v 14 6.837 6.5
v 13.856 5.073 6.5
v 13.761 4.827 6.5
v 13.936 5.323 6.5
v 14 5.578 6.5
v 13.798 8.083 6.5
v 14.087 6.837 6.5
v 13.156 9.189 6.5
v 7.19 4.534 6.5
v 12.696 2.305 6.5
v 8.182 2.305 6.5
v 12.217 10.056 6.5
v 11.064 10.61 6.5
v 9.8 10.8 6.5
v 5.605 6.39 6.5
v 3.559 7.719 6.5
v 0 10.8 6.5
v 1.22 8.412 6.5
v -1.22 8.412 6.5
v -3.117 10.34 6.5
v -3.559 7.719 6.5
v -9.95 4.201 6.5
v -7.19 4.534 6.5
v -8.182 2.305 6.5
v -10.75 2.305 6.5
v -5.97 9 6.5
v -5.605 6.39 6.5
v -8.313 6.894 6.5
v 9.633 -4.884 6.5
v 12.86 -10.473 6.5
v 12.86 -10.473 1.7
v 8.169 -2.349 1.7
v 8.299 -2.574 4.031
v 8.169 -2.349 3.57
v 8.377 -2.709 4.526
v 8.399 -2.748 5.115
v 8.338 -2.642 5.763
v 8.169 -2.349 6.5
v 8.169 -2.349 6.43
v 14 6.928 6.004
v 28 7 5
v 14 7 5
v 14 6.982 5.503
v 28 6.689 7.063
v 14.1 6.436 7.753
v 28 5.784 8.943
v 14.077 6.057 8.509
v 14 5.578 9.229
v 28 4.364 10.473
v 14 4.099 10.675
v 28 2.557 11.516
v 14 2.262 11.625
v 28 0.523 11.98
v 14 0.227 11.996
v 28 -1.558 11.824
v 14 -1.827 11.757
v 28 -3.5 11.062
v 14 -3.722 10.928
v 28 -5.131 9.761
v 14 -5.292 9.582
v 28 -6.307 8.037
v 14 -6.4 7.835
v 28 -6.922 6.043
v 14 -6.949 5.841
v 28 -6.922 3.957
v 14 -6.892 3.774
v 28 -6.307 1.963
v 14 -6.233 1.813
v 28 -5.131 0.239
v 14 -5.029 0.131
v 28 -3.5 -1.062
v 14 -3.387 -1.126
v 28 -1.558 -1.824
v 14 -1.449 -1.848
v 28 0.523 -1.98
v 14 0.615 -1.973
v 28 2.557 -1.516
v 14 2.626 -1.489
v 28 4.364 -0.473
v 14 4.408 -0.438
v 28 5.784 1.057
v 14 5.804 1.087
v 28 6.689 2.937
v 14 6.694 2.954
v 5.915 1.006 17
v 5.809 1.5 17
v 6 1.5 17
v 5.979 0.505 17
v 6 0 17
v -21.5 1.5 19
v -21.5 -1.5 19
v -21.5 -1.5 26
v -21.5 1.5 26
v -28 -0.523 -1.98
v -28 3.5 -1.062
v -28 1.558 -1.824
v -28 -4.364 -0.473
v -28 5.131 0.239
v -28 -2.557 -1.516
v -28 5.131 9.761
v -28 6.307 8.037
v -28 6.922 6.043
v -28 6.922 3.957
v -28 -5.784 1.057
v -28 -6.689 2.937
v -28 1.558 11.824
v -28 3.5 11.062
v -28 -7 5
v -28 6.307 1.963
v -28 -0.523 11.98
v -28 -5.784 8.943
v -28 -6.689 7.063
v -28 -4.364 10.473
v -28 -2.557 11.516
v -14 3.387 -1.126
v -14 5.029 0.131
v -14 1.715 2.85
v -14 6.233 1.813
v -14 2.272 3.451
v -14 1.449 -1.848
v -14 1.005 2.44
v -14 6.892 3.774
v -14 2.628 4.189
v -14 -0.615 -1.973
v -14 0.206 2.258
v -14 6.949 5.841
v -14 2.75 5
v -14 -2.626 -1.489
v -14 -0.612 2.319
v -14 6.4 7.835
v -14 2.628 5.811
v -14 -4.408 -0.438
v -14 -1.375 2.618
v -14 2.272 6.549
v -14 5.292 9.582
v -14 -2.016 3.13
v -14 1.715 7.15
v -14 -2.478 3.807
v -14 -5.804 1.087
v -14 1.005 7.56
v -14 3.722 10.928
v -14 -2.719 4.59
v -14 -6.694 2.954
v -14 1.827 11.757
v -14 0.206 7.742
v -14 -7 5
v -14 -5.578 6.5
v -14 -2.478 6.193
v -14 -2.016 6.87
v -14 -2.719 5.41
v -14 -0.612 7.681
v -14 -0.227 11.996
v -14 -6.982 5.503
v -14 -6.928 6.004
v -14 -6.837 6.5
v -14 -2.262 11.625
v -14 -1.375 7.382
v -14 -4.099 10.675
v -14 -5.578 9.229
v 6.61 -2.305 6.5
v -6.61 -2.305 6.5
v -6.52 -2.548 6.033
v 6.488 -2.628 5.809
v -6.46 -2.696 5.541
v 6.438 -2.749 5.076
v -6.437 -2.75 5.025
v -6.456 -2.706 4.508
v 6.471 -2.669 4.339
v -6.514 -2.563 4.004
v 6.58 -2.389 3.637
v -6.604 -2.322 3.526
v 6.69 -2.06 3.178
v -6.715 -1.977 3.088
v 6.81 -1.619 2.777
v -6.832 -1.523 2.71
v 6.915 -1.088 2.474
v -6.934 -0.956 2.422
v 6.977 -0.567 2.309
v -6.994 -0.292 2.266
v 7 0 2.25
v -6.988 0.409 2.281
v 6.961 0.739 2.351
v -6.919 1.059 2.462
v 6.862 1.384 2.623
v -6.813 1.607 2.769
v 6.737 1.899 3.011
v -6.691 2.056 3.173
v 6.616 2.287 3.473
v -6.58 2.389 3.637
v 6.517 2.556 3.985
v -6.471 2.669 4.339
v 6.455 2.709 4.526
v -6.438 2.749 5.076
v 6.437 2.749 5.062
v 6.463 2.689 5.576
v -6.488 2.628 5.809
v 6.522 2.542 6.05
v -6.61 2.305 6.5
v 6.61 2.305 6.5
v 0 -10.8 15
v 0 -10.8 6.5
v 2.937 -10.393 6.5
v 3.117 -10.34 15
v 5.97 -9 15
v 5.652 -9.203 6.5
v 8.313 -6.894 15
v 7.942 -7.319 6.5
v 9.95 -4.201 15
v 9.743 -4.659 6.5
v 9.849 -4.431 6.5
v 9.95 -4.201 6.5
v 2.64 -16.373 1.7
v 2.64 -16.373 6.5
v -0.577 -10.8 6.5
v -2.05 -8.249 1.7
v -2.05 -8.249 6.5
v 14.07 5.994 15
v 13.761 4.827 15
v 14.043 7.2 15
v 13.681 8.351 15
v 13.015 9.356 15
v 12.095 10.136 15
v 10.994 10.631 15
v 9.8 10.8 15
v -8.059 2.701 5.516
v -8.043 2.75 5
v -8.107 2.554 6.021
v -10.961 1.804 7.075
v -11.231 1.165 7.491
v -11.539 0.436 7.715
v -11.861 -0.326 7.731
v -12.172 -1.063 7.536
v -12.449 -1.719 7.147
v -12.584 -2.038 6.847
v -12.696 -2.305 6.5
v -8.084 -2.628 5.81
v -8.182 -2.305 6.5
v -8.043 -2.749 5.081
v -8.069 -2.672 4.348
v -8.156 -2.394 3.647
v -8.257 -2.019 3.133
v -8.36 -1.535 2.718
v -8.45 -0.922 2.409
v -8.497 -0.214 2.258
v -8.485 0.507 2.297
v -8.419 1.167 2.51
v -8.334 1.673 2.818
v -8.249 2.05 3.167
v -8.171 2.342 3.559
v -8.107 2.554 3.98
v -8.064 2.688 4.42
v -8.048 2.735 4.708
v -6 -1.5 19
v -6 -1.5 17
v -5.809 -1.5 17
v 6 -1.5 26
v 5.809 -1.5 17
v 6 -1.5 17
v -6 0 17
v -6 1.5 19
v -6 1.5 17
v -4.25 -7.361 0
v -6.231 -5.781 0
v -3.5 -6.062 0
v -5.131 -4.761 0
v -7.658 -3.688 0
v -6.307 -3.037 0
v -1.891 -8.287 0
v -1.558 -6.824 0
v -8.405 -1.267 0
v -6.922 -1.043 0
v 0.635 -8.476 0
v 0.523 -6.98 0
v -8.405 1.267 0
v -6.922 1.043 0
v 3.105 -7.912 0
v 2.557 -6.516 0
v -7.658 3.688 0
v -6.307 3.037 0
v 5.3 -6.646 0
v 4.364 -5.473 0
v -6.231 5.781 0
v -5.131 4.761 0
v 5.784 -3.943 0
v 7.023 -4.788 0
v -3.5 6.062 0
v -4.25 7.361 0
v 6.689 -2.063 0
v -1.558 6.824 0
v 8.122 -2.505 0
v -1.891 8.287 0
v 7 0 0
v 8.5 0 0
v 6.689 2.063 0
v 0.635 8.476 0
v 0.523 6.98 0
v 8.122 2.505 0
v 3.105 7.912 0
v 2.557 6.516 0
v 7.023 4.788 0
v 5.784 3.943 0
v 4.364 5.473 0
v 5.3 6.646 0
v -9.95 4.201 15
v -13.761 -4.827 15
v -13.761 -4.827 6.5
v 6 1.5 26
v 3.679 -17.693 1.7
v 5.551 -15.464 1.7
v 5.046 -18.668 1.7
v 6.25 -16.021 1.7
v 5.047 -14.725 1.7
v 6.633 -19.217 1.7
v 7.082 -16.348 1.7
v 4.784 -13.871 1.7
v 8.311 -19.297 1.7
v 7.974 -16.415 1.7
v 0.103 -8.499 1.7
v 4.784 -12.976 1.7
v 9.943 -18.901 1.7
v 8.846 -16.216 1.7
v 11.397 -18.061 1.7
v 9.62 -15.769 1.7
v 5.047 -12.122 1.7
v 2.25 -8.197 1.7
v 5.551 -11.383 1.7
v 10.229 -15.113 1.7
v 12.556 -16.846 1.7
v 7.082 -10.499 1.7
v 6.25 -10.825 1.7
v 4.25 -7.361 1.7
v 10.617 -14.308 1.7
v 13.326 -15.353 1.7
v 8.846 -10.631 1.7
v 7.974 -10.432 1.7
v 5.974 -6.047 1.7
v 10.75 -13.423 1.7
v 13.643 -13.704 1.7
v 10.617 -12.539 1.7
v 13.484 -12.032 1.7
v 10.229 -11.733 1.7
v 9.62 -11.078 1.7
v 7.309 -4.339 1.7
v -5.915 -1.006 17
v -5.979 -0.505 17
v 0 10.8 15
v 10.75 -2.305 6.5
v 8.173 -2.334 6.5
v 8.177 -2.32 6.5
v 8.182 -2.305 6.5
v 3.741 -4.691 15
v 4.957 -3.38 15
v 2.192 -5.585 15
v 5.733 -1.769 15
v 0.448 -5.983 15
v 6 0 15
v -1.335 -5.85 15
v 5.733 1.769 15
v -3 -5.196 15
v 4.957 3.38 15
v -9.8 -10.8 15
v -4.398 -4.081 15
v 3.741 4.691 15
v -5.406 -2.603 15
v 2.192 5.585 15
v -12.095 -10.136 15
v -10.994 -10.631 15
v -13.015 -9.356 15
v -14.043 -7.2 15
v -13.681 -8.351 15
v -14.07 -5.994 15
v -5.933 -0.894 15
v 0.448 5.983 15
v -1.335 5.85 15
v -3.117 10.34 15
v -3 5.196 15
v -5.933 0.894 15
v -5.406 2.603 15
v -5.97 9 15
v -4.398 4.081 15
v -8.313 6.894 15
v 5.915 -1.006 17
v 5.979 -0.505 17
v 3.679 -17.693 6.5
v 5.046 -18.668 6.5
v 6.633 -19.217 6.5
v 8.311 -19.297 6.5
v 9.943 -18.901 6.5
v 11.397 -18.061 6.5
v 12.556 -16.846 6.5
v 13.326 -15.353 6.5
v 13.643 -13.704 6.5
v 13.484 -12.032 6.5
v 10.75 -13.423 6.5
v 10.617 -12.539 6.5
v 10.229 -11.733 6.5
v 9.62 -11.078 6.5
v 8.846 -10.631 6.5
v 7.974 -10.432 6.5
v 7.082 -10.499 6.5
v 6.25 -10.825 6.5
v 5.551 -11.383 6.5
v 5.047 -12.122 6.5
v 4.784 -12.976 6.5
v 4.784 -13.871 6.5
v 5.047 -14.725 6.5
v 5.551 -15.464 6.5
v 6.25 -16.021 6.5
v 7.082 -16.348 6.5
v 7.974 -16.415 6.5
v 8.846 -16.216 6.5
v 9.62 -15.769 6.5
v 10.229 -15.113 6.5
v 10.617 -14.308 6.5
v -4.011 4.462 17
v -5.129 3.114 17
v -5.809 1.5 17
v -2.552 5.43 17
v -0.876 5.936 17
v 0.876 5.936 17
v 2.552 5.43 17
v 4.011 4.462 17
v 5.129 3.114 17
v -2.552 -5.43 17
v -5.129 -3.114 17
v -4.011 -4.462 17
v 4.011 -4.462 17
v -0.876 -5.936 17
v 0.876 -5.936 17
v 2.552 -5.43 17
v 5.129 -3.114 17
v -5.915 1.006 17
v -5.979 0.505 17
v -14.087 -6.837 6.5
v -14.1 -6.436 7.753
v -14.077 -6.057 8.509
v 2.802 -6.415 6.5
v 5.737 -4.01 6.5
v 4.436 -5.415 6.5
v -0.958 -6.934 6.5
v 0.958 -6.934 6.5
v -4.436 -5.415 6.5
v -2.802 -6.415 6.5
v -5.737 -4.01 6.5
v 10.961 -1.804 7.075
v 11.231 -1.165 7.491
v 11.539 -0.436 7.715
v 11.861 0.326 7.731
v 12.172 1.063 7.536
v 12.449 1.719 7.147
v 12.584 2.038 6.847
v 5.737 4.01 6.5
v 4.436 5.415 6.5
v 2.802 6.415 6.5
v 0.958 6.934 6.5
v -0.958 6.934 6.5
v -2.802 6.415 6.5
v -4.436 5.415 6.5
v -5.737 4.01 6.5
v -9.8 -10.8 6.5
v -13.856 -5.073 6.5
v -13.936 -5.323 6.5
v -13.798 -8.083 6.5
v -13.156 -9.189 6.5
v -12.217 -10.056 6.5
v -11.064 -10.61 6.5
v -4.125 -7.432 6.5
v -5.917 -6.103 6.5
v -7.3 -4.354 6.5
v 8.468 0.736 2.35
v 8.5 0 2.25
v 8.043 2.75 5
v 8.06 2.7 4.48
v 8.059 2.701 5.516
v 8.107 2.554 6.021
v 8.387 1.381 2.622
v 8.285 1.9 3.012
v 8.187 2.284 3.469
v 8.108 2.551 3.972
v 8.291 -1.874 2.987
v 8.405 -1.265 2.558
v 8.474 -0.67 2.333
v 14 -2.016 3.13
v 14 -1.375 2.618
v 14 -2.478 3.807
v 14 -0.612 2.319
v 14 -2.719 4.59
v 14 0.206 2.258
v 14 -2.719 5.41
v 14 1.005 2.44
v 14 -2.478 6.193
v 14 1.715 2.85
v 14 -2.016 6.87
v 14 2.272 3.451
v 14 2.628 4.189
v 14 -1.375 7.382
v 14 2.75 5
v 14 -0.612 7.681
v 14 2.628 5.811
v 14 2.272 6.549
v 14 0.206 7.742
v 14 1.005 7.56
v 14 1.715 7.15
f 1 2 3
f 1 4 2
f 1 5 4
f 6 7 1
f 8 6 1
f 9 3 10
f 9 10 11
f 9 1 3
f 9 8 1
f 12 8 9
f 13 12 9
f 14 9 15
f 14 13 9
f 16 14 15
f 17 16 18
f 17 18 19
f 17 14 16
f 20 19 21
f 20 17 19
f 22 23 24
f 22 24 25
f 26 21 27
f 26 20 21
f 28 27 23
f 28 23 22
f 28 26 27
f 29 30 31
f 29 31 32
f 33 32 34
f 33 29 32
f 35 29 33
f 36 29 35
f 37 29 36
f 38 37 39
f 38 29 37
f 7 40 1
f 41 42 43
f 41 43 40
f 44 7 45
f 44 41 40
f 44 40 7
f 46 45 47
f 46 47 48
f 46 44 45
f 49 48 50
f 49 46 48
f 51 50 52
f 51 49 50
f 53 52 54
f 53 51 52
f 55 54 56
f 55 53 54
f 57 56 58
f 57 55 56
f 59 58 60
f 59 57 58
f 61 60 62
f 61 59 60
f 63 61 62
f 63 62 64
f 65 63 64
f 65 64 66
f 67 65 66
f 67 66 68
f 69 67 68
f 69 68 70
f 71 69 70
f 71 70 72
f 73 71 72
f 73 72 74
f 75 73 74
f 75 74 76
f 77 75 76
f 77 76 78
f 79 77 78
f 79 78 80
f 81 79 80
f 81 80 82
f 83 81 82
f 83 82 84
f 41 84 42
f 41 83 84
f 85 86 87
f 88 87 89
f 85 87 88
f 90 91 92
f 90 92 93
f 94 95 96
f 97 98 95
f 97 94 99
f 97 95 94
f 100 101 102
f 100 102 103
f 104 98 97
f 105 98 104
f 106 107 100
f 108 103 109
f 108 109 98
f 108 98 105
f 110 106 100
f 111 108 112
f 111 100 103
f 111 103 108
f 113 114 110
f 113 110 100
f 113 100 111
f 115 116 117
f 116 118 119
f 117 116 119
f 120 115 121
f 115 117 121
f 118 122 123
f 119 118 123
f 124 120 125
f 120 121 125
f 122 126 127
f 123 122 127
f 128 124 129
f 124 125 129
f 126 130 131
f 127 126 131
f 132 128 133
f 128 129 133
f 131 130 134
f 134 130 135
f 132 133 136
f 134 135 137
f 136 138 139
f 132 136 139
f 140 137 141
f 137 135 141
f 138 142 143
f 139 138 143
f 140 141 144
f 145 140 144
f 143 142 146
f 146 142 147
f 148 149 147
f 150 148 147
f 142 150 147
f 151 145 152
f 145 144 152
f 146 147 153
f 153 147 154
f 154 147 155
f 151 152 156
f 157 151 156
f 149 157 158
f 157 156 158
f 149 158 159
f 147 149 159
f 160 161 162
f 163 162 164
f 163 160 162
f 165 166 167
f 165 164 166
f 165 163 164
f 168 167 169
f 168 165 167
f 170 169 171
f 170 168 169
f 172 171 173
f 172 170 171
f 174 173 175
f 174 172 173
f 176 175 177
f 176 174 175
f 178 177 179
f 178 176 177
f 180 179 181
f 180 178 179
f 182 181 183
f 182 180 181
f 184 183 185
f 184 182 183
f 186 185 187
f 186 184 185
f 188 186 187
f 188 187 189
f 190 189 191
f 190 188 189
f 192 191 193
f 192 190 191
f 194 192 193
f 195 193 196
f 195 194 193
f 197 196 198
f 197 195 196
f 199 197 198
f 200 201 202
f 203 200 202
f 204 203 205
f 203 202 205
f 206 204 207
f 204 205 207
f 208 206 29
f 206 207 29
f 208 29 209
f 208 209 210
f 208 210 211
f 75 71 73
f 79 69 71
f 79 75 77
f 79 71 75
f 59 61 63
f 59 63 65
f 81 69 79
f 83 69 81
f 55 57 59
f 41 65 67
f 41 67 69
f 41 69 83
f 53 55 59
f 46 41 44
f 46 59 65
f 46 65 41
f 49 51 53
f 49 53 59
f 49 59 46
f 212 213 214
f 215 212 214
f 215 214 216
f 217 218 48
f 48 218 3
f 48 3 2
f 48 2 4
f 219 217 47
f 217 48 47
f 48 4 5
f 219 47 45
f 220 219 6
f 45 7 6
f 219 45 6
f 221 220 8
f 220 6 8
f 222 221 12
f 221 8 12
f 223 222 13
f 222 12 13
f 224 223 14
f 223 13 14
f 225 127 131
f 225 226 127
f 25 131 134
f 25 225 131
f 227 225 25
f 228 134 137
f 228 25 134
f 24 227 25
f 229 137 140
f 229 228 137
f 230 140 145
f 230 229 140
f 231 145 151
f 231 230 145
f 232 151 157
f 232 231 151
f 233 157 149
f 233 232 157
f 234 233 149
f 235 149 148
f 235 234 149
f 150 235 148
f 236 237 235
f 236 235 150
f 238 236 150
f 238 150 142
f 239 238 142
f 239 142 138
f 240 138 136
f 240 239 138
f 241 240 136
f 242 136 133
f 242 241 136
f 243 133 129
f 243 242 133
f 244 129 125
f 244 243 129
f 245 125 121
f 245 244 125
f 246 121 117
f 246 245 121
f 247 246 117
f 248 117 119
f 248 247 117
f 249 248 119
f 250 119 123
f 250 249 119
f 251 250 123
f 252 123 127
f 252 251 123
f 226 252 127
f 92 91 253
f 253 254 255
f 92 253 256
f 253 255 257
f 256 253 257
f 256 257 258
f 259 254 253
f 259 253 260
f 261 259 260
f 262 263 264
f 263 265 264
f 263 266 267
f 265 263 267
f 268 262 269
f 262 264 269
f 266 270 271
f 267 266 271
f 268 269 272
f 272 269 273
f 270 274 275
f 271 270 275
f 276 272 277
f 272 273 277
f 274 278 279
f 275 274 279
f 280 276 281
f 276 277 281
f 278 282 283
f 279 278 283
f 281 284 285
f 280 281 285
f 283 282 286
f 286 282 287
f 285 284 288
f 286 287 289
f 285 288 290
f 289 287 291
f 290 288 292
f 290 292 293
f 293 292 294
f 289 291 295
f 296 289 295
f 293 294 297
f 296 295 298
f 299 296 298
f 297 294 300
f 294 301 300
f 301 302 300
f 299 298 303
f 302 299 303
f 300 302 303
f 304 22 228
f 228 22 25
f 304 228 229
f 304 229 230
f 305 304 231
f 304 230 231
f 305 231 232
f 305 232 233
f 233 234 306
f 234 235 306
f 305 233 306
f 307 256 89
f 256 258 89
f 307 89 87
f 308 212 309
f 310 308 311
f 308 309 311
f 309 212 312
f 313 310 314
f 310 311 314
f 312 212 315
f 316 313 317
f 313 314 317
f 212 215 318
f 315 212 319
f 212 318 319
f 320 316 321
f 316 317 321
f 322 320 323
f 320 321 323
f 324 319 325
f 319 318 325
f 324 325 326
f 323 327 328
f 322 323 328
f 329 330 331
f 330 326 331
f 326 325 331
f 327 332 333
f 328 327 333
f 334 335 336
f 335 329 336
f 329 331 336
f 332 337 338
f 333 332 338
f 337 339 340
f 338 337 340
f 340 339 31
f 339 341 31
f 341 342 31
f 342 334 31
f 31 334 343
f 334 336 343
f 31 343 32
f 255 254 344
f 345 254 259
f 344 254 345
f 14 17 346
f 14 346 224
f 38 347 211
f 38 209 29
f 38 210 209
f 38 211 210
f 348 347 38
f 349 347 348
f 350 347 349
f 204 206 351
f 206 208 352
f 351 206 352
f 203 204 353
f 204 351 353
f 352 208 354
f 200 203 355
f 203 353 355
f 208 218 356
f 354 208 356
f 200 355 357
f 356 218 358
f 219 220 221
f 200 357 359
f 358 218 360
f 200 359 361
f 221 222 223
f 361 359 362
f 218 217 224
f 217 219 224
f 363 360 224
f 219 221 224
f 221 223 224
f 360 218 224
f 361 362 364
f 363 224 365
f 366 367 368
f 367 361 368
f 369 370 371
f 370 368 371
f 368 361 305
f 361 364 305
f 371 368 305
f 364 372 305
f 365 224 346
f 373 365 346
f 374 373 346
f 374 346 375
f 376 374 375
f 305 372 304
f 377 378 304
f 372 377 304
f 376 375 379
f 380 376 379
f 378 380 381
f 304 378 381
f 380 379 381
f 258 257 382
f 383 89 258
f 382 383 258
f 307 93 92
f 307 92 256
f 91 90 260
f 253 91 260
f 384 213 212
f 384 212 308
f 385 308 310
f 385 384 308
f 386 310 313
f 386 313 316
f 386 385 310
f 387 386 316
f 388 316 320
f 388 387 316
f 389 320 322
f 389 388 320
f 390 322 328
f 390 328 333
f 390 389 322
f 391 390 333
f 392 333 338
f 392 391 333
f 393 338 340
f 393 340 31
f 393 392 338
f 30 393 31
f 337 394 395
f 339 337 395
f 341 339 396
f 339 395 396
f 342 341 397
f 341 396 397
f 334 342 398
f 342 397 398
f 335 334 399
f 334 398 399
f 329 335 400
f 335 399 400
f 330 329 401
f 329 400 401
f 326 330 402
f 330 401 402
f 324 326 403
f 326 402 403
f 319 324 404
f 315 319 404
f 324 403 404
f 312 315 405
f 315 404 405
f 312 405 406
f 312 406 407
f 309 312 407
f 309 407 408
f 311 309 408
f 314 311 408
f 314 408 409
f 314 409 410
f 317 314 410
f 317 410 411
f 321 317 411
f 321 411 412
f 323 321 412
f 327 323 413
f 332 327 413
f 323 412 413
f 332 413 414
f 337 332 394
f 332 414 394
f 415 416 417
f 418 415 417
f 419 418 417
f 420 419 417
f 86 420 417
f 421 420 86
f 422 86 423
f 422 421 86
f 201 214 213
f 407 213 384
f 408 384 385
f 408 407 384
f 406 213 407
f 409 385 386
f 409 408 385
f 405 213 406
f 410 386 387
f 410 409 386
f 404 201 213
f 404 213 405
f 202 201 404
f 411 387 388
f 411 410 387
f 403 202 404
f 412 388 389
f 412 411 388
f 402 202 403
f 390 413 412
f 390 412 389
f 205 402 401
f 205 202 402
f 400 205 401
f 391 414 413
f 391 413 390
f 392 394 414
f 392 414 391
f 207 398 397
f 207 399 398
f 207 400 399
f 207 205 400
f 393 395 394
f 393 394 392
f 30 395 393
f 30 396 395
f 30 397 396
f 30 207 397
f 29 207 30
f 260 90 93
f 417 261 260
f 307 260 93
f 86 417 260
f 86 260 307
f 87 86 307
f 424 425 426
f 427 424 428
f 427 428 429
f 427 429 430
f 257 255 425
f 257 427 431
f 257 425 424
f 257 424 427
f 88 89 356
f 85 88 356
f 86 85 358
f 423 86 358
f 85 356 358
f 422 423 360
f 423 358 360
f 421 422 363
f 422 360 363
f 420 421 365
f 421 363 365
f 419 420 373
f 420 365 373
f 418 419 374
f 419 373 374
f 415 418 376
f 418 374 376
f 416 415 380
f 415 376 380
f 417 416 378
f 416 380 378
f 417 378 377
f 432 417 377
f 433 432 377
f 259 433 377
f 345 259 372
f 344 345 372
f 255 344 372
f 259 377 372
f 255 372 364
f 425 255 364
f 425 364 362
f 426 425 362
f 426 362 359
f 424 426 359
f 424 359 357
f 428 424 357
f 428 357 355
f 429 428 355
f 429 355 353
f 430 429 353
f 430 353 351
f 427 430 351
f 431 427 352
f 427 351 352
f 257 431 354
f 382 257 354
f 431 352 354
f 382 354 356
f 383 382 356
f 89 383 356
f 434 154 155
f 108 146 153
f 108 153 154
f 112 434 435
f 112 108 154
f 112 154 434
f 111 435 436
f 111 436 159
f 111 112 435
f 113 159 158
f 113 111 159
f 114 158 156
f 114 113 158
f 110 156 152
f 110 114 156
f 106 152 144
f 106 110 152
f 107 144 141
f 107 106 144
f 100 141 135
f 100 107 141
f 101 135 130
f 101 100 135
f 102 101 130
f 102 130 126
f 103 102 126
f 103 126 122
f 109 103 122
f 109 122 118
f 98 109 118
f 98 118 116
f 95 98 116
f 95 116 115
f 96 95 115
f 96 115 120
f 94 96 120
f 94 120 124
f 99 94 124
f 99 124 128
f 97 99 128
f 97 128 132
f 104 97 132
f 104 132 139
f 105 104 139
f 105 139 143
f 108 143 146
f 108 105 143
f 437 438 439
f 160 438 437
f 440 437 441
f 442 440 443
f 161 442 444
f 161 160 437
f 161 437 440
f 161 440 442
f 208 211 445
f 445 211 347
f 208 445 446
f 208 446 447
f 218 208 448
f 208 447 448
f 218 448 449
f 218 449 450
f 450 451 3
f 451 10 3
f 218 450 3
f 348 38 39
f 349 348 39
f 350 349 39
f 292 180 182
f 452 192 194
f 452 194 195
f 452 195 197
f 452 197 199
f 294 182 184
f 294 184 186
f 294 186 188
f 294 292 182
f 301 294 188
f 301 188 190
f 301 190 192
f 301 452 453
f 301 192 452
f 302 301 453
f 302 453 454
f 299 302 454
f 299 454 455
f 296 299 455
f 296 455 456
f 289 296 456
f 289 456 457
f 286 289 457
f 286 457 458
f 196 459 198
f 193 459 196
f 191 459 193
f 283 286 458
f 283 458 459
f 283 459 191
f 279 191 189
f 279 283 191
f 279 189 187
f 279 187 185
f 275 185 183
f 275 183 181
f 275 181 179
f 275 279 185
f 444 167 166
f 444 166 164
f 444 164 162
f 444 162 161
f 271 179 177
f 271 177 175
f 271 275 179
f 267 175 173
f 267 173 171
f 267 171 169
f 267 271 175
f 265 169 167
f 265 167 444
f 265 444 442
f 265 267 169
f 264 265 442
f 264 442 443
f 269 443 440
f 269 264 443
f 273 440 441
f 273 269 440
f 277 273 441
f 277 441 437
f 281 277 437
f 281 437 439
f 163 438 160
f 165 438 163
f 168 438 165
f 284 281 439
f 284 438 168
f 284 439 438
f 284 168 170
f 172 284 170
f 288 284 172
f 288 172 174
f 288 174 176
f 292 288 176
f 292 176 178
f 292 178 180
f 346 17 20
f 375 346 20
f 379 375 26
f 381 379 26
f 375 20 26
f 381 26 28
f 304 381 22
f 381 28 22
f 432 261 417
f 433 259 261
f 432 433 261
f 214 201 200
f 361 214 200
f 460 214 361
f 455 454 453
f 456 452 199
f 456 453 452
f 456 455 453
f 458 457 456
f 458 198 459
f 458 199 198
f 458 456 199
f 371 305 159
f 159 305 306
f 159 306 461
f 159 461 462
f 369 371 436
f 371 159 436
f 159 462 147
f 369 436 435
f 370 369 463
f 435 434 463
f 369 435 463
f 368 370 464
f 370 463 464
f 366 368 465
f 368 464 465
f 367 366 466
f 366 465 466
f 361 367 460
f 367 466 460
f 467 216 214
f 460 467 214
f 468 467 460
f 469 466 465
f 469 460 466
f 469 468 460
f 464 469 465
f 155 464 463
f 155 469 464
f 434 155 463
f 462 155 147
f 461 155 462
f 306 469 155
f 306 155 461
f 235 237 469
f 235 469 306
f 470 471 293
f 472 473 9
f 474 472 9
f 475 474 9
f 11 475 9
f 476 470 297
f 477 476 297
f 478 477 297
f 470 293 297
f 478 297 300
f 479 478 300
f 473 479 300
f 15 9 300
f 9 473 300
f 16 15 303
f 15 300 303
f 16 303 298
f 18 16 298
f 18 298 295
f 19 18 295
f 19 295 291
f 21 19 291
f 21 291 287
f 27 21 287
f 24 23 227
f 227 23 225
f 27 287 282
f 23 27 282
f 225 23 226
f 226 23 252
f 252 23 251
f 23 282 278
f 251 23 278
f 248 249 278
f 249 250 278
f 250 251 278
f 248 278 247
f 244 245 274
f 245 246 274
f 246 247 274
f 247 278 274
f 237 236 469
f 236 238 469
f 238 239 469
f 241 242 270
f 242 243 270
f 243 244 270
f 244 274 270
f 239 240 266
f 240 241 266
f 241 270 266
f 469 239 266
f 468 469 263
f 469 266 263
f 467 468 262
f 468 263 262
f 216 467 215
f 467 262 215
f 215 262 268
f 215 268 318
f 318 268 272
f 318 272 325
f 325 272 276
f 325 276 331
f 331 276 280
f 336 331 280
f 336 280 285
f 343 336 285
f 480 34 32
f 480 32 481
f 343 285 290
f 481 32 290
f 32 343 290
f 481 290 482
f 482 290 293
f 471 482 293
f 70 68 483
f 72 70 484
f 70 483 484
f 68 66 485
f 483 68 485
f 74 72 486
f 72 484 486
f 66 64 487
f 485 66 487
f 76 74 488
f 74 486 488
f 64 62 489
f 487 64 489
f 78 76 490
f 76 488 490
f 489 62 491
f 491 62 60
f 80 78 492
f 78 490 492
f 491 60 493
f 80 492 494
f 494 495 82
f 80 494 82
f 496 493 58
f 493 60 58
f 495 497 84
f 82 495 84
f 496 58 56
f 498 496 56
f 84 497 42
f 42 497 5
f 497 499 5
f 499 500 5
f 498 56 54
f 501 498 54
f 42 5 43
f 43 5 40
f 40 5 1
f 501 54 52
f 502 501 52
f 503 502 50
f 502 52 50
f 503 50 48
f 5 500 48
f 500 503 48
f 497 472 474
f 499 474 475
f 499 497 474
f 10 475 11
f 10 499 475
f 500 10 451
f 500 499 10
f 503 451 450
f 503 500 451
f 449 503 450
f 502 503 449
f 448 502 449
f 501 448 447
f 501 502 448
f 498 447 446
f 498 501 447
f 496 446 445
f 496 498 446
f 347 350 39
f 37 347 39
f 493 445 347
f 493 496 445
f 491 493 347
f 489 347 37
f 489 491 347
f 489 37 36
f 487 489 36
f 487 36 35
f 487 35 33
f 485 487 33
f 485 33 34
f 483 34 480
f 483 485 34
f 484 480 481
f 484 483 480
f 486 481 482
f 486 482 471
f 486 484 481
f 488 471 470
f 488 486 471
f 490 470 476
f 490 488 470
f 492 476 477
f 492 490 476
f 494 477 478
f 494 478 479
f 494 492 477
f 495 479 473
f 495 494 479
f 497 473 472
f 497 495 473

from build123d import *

# Parameters (mm, degrees)
SKETCH_R     = 8.5
SKETCH_R_2   = 7
PAD_DEPTH    = 6.5
SKETCH001_R  = 3
PAD001_DEPTH = 4.8
PAD002_DEPTH = 8.5
SKETCH003_R  = 6
PAD003_DEPTH = 2
SKETCH004_W  = 12
SKETCH004_H  = 3
PAD004_DEPTH = 2
SKETCH005_W  = 27.5
SKETCH005_H  = 3
PAD005_DEPTH = 7
SKETCH006_R  = 2.75
PAD006_DEPTH = 28
SKETCH007_R  = 7
PAD007_DEPTH = 14
SKETCH008_R  = 7
PAD008_DEPTH = 14


with BuildPart() as part:
    # Sketch → Pad (new body)
    with BuildSketch(Plane.XY):
        Circle(SKETCH_R)
        Circle(SKETCH_R_2, mode=Mode.SUBTRACT)
    extrude(amount=PAD_DEPTH)

    # Sketch001 (on Face4 of Pad) → Pad001 (join)
    with BuildSketch(Plane.XY.offset(6.5)):
        with BuildLine():
            ThreePointArc((2.6404501177, -16.3733937587), (10.7, -18.532943641), (12.8595498823, -10.4733937587))
            Line((12.8595498823, -10.4733937587), (8.1689615905, -2.3490565198))
            ThreePointArc((-2.0501381742, -8.2490565198), (4.25, -7.3612159322), (8.1689615905, -2.3490565198))
            Line((2.6404501177, -16.3733937587), (-2.0501381742, -8.2490565198))
        make_face()
        with Locations((7.75, -13.4233937587)):
            Circle(SKETCH001_R, mode=Mode.SUBTRACT)
    extrude(amount=-PAD001_DEPTH)

    # Sketch002 (on Face3 of Pad001) → Pad002 (join)
    with BuildSketch(Plane.XY.offset(6.5)):
        with BuildLine():
            Line((0, 10.8), (9.8, 10.8))
            ThreePointArc((13.7613854943, 4.8274495625), (13.3834317966, 8.8767659875), (9.8, 10.8))
            Line((9.9495263577, -4.2008243546), (13.7613854943, 4.8274495625))
            ThreePointArc((0, -10.8), (5.9695517826, -9.000247303), (9.9495263577, -4.2008243546))
            Line((0, -10.8), (-9.8000000001, -10.8))
            ThreePointArc((-13.7613854943, -4.8274495625), (-13.3834317966, -8.8767659875), (-9.8000000001, -10.8))
            Line((-9.9495263577, 4.2008243546), (-13.7613854943, -4.8274495625))
            ThreePointArc((7e-10, 10.8), (-5.9695517823, 9.0002473032), (-9.9495263577, 4.2008243546))
        make_face()
    extrude(amount=PAD002_DEPTH)

    # Sketch003 (on Face20 of Pad002) → Pad003 (join)
    with BuildSketch(Plane.XY.offset(15)):
        Circle(SKETCH003_R)
    extrude(amount=PAD003_DEPTH)

    # Sketch004 (on Face22 of Pad003) → Pad004 (join)
    with BuildSketch(Plane.XY.offset(17)):
        Rectangle(SKETCH004_W, SKETCH004_H)
    extrude(amount=PAD004_DEPTH)

    # Sketch005 (on Face32 of Pad004) → Pad005 (join)
    with BuildSketch(Plane.XY.offset(19)):
        with Locations((-7.75, 0)):
            Rectangle(SKETCH005_W, SKETCH005_H)
    extrude(amount=PAD005_DEPTH)

    # Sketch006 → Pad006 (join, symmetric)
    with BuildSketch(Plane.YZ):
        with Locations((0, 5)):
            Circle(SKETCH006_R)
    extrude(amount=PAD006_DEPTH, both=True)

    # Sketch007 (on Face13 of Pad006) → Pad007 (join)
    with BuildSketch(Plane.YZ.offset(28)):
        with Locations((0, 5)):
            Circle(SKETCH007_R)
    extrude(amount=-PAD007_DEPTH)

    # Sketch008 (on Face20 of Pad007) → Pad008 (join)
    with BuildSketch(Plane(origin=(-28, 0, 0), x_dir=(0, -1, 0), z_dir=(-1, 0, 0))):
        with Locations((0, 5)):
            Circle(SKETCH008_R)
    extrude(amount=-PAD008_DEPTH)


solid = part.part
